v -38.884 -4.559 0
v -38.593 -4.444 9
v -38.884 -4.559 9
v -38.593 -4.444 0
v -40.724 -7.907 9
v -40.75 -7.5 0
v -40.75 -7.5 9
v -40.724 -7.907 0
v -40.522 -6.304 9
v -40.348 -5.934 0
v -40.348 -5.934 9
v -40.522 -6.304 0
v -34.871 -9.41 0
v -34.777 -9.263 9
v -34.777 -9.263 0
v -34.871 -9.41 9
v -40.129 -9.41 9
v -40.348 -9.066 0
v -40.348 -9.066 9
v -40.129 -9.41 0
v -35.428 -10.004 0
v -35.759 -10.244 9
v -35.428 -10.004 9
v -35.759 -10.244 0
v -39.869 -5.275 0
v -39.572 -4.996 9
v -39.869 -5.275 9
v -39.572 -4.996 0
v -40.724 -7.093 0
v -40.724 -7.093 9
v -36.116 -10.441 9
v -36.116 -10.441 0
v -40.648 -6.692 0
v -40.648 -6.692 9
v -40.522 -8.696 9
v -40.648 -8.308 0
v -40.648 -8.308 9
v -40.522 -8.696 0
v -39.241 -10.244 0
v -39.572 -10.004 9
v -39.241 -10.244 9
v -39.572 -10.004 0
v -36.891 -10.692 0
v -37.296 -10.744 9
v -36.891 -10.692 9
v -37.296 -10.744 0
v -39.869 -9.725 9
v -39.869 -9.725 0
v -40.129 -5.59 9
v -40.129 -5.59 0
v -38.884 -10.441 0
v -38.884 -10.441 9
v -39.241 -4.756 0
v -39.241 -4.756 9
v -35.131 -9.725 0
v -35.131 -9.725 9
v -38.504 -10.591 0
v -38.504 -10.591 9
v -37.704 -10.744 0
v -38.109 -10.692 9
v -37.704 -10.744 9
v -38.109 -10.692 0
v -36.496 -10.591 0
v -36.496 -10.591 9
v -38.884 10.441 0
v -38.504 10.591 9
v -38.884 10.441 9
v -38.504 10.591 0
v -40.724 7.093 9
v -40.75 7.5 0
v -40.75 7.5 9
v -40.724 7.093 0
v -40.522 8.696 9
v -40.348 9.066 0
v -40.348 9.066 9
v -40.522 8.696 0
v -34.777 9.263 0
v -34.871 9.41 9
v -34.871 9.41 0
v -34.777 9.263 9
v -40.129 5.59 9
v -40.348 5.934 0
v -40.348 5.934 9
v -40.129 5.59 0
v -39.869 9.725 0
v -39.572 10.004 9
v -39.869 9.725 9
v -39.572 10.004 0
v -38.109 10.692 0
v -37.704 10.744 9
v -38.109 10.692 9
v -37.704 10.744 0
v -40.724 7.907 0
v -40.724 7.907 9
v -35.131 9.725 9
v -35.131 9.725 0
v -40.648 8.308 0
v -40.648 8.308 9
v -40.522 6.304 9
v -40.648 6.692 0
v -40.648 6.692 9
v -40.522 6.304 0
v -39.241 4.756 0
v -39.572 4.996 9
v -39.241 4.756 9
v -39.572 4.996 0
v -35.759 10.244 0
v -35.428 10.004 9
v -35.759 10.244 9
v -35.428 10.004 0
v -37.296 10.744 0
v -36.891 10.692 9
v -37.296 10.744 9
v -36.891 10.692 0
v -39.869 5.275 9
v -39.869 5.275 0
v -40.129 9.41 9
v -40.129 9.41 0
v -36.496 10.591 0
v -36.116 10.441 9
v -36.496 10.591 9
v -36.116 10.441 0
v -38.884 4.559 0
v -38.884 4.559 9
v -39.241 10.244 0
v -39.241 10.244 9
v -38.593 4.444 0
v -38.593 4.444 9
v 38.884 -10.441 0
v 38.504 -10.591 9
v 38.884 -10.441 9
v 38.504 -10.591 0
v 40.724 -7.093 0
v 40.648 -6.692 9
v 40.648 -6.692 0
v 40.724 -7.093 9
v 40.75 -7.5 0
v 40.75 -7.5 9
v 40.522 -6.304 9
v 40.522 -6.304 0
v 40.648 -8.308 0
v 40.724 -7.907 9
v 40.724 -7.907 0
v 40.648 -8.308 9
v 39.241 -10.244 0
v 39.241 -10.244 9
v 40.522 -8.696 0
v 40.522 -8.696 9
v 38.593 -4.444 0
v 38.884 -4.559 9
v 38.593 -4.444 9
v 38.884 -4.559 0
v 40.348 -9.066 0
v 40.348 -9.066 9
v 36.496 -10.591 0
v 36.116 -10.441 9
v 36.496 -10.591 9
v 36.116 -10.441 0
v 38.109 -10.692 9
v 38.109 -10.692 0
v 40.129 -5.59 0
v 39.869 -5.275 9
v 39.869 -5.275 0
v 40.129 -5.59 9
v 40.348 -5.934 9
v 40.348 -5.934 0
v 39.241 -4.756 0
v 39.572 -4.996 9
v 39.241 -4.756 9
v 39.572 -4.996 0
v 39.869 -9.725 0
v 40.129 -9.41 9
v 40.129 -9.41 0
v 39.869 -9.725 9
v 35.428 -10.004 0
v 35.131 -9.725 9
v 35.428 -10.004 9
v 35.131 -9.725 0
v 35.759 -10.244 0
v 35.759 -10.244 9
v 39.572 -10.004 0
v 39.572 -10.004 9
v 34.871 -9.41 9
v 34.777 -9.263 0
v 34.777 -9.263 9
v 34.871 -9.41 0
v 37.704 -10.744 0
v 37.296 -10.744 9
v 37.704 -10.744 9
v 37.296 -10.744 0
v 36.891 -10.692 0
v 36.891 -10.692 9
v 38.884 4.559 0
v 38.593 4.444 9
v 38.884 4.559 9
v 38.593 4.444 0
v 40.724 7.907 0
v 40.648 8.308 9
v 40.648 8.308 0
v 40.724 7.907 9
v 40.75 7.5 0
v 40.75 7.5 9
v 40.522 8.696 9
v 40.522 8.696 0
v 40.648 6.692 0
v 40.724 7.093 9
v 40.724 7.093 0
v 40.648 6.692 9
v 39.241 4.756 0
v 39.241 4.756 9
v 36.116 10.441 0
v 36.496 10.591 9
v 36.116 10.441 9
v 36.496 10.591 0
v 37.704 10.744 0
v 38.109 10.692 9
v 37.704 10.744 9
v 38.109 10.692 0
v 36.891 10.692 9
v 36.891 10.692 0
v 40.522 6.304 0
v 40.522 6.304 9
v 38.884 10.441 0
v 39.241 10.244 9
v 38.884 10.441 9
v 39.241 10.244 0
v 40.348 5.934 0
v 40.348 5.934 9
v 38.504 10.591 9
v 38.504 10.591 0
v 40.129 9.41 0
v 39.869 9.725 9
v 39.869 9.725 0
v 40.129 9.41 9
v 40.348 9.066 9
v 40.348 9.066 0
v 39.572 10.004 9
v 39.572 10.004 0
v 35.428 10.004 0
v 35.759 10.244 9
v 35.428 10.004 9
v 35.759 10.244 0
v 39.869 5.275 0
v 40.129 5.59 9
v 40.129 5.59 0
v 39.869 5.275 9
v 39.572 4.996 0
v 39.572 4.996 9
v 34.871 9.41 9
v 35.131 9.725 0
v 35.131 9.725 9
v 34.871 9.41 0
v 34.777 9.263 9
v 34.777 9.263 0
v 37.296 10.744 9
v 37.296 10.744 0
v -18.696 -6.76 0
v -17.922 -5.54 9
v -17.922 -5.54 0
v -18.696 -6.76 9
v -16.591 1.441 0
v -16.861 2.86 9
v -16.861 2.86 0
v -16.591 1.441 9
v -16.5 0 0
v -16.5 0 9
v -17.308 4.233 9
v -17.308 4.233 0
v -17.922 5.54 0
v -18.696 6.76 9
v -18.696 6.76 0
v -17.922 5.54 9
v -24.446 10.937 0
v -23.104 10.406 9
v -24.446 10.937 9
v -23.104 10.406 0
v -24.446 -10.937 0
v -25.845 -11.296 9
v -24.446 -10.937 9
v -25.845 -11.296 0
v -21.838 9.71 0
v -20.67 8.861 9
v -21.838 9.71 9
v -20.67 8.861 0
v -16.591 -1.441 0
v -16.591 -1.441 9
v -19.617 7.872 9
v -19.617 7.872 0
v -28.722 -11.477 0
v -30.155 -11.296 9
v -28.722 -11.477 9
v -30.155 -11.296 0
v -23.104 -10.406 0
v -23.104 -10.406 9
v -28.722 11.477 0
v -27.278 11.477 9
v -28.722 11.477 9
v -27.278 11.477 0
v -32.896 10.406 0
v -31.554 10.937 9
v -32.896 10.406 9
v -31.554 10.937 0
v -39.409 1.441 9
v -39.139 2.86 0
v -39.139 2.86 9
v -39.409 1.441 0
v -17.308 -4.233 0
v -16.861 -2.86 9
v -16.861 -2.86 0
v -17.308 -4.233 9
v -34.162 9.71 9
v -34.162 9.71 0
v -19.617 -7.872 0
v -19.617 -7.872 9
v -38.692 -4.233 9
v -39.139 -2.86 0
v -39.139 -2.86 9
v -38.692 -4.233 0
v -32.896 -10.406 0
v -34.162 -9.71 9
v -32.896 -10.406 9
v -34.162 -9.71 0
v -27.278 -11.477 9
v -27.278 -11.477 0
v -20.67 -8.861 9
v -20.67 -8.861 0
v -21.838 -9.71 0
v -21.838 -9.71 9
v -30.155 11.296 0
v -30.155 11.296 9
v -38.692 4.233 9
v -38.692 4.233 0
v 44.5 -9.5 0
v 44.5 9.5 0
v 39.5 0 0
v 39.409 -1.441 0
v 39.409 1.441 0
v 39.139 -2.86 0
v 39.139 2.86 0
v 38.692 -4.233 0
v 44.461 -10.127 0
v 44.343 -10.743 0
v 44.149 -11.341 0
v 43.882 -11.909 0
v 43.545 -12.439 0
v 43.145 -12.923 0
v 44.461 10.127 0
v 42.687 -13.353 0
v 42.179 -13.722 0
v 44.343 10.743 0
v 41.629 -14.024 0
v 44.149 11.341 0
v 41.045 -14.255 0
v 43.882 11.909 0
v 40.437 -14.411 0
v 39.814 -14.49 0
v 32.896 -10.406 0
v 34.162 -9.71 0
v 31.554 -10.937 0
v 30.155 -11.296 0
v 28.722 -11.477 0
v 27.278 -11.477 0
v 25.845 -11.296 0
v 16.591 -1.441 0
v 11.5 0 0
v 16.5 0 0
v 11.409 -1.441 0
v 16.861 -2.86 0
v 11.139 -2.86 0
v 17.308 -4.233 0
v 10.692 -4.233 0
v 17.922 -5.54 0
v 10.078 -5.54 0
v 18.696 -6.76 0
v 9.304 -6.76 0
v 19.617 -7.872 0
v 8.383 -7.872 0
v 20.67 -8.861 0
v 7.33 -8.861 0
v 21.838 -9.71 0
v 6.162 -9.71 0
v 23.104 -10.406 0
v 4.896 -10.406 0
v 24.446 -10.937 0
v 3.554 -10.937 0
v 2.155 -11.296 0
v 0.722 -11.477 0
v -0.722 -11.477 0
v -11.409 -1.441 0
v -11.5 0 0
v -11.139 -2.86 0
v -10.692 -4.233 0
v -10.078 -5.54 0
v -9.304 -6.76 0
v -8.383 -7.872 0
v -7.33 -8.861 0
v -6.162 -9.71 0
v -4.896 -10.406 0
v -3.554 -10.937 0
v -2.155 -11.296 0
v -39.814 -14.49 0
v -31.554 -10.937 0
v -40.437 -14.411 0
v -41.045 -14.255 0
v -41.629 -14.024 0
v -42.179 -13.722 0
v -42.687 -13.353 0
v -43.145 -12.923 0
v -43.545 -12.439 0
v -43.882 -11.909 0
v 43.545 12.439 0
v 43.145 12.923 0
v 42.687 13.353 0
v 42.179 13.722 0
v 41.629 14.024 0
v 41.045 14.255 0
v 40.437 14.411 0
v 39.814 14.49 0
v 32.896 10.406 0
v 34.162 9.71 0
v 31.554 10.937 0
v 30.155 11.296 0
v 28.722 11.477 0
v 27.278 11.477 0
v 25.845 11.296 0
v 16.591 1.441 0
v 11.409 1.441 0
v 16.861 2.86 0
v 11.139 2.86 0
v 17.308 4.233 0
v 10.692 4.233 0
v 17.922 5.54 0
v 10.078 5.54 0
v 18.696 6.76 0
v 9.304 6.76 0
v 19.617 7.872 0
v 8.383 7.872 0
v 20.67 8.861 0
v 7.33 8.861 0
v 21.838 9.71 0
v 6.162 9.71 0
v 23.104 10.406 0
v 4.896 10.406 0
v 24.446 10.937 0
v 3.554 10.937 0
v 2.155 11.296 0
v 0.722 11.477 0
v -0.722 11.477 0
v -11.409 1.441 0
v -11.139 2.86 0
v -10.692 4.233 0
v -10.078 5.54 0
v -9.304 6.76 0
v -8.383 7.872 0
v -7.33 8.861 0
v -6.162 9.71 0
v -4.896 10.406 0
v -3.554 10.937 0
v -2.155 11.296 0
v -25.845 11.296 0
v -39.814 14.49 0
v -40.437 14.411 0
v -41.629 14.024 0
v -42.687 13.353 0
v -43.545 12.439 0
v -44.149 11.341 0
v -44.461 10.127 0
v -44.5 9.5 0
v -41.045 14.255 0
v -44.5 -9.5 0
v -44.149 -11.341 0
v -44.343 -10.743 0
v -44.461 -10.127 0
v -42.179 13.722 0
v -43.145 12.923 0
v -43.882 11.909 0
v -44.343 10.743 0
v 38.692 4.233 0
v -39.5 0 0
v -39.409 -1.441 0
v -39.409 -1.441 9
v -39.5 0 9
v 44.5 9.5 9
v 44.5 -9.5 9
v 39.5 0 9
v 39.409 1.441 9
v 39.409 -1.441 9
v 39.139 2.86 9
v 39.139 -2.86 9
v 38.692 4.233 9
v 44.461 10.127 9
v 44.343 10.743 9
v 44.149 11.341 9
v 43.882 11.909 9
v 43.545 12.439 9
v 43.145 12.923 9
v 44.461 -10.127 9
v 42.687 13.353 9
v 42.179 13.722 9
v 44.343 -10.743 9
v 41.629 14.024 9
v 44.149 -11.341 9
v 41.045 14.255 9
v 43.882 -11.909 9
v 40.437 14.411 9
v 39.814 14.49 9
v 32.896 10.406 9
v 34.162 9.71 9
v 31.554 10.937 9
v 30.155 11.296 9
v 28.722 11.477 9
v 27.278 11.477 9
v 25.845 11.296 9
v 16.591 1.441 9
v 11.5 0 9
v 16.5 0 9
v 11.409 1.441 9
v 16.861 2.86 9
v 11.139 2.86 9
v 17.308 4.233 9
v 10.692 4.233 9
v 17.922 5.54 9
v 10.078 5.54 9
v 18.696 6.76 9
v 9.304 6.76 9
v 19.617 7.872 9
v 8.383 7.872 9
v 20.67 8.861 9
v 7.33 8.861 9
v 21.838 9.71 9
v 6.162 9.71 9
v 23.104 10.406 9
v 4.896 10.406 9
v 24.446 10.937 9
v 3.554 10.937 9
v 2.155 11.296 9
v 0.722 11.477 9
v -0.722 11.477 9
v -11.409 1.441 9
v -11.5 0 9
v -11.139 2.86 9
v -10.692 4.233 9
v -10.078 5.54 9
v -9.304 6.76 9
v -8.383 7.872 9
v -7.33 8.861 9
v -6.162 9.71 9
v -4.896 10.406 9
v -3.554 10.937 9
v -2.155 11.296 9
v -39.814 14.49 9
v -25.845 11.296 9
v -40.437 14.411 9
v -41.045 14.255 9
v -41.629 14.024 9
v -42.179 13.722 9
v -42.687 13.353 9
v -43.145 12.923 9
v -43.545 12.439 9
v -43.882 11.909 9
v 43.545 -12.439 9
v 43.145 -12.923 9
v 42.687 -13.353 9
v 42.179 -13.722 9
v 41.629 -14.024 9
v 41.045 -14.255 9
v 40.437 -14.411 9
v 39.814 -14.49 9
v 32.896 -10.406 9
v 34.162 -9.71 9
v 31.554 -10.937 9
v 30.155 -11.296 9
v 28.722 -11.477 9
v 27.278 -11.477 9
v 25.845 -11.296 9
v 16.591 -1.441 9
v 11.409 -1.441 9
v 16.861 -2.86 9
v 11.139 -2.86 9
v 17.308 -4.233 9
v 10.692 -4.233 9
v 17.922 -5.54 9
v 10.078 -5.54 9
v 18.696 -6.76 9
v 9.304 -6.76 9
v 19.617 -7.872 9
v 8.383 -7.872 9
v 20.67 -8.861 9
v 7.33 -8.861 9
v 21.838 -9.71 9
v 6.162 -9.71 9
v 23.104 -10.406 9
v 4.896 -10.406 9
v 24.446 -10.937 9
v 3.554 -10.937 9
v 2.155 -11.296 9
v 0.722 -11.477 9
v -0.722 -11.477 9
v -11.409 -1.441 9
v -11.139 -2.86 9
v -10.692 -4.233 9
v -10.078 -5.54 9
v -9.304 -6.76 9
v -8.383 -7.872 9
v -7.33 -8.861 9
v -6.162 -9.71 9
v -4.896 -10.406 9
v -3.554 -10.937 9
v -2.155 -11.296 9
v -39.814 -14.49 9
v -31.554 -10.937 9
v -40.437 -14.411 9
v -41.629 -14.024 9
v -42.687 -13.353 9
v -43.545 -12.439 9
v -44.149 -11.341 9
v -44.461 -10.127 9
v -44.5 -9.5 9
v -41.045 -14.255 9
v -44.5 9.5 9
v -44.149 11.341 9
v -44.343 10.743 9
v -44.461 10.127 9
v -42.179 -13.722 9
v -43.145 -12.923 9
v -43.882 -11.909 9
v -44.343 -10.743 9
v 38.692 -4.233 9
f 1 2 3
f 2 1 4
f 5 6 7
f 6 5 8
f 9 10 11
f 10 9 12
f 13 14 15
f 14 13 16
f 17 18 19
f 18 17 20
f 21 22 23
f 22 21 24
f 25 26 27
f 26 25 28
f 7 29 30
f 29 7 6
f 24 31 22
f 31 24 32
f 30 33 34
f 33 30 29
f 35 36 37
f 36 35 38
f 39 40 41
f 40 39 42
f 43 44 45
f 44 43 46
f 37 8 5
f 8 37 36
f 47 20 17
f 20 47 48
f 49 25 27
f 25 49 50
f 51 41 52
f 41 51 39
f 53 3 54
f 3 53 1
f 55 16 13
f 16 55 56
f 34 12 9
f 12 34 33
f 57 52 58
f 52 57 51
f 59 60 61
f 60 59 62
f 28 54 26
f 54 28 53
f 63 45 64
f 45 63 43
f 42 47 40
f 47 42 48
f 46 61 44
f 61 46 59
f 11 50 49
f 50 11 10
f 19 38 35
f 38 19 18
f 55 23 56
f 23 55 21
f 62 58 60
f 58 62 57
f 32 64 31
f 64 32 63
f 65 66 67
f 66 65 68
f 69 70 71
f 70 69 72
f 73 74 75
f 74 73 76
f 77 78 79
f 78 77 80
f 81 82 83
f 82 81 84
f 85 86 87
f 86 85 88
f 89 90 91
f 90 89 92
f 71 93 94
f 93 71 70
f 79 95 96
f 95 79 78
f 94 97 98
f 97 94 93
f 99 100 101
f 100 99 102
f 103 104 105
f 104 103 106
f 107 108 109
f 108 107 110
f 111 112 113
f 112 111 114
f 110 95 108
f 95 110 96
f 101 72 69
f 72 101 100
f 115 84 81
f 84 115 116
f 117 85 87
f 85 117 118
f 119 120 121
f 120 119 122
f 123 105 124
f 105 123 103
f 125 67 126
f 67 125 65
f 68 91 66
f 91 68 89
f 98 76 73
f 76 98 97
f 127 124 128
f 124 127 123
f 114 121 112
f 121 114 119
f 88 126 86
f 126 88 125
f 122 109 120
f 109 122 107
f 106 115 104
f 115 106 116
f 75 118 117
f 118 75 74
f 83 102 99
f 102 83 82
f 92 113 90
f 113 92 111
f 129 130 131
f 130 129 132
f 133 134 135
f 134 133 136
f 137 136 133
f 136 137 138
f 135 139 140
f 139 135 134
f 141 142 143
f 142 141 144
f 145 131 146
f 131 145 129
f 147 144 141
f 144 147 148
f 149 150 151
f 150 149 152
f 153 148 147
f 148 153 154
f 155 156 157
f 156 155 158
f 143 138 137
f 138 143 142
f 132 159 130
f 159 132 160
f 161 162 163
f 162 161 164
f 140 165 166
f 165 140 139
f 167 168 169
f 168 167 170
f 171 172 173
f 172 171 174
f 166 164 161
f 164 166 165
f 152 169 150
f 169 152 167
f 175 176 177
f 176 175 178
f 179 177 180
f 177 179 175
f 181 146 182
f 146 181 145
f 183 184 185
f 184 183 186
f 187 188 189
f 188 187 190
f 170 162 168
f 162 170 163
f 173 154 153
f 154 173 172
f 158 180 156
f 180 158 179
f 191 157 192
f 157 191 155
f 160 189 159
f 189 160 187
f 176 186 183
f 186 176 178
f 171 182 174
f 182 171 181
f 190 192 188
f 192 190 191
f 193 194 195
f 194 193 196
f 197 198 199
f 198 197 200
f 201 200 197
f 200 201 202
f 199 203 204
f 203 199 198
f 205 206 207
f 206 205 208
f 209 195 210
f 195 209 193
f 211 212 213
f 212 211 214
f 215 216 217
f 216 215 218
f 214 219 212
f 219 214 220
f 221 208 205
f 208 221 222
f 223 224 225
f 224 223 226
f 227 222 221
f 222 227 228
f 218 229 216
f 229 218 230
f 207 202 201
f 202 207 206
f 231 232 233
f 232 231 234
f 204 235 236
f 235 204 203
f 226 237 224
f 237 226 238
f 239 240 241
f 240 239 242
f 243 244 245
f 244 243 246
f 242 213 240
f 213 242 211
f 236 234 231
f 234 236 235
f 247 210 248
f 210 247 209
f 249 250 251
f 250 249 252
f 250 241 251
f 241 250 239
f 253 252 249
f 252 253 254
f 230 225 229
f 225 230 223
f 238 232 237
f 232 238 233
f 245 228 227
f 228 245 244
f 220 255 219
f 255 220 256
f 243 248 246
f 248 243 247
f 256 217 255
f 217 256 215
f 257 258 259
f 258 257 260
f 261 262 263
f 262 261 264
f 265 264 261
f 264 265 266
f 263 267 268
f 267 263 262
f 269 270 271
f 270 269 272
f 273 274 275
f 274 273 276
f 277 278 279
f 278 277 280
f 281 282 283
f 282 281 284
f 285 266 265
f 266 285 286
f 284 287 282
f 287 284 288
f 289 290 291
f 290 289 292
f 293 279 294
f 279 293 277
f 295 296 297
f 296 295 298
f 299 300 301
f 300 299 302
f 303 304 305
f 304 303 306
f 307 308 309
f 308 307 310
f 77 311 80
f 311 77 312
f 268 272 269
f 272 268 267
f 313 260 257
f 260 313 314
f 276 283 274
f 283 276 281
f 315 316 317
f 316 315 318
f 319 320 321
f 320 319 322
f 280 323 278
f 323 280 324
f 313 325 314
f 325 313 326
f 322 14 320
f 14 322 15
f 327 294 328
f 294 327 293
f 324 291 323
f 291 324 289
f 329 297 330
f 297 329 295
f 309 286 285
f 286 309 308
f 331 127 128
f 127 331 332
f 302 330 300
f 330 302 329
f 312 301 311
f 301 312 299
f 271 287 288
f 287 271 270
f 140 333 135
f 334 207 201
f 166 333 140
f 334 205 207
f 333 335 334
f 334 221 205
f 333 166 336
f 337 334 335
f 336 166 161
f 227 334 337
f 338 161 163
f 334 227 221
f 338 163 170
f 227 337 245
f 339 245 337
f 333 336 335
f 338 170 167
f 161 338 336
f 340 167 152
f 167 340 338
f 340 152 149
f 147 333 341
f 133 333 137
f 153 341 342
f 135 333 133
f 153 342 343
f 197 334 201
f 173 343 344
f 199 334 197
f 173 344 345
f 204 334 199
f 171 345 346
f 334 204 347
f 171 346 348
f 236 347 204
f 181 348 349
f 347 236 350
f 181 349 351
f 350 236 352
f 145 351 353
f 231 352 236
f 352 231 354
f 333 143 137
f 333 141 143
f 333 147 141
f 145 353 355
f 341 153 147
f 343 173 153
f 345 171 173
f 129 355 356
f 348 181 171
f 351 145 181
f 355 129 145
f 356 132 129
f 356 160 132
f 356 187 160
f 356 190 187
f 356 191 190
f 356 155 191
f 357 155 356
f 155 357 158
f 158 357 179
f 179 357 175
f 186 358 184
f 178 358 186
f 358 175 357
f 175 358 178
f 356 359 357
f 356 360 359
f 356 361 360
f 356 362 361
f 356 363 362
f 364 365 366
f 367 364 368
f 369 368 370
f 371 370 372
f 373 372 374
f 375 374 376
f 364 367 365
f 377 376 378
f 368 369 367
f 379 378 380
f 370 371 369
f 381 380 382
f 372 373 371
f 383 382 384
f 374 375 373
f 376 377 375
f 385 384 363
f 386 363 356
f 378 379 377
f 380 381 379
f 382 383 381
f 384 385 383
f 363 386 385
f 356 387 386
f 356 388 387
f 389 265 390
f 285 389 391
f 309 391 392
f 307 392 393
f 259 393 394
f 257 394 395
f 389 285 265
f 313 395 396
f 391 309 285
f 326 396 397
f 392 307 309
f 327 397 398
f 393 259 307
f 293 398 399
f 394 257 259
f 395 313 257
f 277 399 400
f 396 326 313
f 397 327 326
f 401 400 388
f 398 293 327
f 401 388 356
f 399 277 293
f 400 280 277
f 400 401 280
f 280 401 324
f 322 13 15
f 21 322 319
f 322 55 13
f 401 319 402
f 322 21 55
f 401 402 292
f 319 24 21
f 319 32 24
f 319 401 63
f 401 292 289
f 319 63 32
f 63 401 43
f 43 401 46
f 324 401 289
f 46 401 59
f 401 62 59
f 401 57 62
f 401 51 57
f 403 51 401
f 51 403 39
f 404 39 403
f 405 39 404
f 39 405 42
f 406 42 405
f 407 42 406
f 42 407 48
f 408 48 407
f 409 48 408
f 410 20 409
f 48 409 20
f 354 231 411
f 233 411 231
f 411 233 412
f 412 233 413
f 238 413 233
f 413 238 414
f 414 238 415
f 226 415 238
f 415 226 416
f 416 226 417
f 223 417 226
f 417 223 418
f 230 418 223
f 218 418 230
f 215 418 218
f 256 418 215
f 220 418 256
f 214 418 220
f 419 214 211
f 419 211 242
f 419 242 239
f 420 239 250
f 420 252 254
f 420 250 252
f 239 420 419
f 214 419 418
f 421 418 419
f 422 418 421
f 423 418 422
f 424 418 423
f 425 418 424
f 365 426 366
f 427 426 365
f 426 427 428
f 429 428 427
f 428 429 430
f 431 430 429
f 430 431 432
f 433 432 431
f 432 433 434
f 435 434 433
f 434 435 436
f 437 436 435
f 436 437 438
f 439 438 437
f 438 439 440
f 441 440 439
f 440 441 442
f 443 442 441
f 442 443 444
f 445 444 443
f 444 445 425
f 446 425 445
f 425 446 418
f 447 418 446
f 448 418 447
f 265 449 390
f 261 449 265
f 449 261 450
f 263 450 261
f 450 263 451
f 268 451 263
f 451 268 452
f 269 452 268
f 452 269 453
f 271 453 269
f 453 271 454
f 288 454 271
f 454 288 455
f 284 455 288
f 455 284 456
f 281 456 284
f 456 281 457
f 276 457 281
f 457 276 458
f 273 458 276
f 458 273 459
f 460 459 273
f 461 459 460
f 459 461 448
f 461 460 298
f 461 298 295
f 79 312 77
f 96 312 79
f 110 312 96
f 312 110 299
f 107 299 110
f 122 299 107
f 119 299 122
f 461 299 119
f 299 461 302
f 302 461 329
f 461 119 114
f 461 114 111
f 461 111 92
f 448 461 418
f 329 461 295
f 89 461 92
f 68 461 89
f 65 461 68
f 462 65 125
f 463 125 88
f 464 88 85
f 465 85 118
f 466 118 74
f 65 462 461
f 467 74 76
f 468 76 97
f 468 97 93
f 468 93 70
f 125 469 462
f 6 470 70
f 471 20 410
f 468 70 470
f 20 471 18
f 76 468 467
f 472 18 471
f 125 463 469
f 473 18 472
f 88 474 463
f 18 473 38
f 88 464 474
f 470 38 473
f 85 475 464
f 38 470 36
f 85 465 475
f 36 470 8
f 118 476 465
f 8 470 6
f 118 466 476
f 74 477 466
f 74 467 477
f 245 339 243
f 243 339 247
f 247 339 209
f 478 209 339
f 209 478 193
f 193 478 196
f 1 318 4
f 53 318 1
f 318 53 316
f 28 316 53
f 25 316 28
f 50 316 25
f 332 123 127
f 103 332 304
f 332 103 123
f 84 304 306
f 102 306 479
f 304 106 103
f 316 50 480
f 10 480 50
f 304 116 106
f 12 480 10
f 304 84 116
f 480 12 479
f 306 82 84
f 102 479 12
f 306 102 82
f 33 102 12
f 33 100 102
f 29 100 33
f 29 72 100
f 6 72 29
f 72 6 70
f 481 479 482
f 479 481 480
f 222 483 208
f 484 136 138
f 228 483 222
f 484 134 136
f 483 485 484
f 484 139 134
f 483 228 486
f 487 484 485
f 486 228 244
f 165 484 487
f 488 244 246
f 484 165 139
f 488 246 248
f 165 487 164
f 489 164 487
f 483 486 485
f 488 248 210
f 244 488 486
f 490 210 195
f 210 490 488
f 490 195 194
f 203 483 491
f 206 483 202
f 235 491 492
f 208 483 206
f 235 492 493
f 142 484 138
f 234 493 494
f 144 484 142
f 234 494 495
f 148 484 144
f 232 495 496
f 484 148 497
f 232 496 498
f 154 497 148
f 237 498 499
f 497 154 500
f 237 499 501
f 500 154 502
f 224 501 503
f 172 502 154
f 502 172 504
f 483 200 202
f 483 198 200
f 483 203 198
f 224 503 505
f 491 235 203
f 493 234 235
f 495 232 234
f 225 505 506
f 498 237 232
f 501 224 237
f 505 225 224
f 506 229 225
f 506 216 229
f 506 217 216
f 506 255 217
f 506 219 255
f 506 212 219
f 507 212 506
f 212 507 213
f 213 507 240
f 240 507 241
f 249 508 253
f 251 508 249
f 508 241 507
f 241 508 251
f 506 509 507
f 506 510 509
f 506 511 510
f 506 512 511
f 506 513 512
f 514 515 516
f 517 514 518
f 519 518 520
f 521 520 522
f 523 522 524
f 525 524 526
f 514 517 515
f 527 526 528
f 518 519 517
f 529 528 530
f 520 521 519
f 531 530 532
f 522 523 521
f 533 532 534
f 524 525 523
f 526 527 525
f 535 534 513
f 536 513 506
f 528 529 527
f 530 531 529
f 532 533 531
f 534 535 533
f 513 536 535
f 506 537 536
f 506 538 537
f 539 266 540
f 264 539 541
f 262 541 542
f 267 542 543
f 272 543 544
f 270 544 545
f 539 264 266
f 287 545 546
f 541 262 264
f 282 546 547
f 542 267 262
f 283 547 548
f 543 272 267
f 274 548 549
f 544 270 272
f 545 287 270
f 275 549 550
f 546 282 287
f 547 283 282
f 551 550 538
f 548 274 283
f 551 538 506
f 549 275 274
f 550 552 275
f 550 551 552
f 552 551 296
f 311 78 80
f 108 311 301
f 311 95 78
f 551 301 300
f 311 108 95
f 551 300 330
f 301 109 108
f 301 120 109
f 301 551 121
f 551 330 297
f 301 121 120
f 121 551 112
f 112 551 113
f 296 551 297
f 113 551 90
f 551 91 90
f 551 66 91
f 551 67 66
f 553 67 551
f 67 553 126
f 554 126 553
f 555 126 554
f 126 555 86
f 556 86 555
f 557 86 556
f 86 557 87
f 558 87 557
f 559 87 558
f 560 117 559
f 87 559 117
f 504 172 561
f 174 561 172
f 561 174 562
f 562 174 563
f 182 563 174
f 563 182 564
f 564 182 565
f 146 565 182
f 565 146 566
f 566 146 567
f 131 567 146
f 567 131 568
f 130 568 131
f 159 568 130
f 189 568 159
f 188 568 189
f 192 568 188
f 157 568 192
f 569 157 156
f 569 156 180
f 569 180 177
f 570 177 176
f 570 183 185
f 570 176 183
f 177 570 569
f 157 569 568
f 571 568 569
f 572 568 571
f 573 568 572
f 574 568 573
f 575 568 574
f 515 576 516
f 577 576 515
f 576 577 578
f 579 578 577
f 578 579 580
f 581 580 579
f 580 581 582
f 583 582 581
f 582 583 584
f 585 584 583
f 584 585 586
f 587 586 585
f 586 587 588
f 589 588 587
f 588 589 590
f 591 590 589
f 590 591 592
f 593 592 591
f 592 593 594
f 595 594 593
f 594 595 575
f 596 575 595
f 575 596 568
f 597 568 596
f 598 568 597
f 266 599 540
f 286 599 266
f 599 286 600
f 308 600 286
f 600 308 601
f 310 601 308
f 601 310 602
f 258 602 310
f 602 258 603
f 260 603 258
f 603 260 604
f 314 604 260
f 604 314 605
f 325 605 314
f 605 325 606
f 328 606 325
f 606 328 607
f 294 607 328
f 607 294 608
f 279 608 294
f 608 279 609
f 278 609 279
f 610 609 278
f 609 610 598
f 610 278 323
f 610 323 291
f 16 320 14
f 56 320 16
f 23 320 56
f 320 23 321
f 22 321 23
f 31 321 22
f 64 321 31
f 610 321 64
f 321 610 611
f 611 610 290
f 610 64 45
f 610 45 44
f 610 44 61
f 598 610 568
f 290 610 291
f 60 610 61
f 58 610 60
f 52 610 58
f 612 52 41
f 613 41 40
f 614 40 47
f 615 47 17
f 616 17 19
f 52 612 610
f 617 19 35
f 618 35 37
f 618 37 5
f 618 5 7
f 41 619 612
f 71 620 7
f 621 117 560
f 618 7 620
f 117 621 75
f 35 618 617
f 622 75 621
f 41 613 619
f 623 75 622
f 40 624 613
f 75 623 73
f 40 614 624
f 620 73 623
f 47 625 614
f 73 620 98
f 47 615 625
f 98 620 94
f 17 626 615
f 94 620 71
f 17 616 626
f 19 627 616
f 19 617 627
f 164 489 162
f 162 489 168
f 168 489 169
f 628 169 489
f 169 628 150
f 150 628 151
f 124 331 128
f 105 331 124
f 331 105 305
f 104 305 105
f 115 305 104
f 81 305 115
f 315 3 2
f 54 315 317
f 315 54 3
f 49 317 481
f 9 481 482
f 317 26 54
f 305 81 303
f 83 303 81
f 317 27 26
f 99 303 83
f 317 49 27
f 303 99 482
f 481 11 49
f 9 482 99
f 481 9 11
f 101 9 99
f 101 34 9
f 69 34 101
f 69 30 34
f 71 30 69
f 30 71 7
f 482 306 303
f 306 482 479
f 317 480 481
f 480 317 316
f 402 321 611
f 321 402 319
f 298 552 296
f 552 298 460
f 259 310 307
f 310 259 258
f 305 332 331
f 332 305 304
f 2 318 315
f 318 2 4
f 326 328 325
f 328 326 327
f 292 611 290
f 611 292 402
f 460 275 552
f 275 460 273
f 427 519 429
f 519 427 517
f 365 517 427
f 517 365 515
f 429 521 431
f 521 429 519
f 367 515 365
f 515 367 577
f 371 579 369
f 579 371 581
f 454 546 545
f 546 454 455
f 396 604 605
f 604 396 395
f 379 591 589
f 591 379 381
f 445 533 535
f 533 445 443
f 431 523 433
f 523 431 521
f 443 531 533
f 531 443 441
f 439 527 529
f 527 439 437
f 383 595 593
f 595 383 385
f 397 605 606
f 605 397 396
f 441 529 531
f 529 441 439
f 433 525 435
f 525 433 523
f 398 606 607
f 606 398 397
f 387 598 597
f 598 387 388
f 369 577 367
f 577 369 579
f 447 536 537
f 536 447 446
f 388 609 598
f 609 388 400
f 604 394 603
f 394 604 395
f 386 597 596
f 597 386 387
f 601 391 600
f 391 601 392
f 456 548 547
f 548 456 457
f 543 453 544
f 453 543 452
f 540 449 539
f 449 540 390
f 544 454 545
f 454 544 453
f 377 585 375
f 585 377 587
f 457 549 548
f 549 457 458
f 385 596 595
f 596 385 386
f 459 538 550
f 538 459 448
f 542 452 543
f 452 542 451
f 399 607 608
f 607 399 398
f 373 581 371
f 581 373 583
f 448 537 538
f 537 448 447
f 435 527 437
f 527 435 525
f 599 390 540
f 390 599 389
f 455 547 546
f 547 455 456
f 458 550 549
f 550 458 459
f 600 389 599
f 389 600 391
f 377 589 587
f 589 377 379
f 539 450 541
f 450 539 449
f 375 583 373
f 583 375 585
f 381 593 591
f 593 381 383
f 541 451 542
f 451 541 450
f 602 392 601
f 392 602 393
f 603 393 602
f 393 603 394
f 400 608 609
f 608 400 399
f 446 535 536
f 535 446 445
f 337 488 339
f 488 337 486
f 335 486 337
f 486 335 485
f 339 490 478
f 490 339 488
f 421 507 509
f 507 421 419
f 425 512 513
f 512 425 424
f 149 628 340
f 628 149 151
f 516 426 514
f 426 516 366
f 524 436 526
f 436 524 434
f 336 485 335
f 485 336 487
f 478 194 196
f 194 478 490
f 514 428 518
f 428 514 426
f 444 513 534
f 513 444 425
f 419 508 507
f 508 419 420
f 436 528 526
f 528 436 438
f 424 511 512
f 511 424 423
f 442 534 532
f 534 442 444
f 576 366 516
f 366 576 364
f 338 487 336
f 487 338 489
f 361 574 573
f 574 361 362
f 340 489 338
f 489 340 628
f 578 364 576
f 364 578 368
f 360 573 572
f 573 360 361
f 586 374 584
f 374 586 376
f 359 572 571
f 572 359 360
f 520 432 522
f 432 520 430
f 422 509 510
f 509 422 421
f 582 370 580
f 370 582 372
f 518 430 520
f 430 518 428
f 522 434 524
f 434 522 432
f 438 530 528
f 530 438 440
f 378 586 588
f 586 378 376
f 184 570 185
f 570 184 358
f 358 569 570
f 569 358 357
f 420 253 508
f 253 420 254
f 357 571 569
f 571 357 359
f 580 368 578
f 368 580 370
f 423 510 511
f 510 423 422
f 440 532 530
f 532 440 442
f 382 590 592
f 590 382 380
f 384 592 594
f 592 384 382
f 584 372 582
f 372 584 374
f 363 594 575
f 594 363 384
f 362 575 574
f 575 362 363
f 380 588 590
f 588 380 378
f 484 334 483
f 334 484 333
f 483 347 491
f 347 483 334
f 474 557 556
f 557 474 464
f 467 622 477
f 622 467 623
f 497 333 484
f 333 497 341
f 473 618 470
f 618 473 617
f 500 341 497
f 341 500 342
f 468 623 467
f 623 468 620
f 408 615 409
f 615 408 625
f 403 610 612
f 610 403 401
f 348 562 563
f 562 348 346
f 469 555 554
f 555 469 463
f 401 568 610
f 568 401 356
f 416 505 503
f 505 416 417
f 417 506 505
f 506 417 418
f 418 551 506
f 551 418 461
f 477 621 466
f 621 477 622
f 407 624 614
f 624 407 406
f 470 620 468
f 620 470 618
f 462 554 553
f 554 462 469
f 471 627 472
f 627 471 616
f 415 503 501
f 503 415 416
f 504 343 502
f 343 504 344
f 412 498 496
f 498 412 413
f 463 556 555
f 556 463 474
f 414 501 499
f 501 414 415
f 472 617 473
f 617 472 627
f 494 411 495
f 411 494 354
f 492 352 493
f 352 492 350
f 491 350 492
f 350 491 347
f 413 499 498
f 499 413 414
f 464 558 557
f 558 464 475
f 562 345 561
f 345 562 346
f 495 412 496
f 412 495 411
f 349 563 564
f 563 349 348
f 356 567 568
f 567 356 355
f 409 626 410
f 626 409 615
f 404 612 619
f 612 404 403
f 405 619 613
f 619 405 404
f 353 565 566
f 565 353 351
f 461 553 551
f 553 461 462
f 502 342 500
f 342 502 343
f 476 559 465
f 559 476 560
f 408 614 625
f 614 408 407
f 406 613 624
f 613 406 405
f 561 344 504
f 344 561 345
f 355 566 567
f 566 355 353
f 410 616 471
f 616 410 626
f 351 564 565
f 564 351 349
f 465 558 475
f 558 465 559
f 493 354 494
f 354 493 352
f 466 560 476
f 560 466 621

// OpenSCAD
$fn = 50;


difference() {
	union() {
		hull() {
			translate(v = [-39.5000000000, 9.5000000000, 0]) {
				cylinder(h = 9, r = 5);
			}
			translate(v = [39.5000000000, 9.5000000000, 0]) {
				cylinder(h = 9, r = 5);
			}
			translate(v = [-39.5000000000, -9.5000000000, 0]) {
				cylinder(h = 9, r = 5);
			}
			translate(v = [39.5000000000, -9.5000000000, 0]) {
				cylinder(h = 9, r = 5);
			}
		}
	}
	union() {
		#translate(v = [-37.5000000000, -7.5000000000, -100.0000000000]) {
			cylinder(h = 200, r = 3.2500000000);
		}
		#translate(v = [-37.5000000000, 7.5000000000, -100.0000000000]) {
			cylinder(h = 200, r = 3.2500000000);
		}
		#translate(v = [37.5000000000, -7.5000000000, -100.0000000000]) {
			cylinder(h = 200, r = 3.2500000000);
		}
		#translate(v = [37.5000000000, 7.5000000000, -100.0000000000]) {
			cylinder(h = 200, r = 3.2500000000);
		}
		#translate(v = [-28.0000000000, 0, 0]) {
			cylinder(h = 9, r = 11.5000000000);
		}
		#cylinder(h = 9, r = 11.5000000000);
		#translate(v = [28.0000000000, 0, 0]) {
			cylinder(h = 9, r = 11.5000000000);
		}
	}
}
